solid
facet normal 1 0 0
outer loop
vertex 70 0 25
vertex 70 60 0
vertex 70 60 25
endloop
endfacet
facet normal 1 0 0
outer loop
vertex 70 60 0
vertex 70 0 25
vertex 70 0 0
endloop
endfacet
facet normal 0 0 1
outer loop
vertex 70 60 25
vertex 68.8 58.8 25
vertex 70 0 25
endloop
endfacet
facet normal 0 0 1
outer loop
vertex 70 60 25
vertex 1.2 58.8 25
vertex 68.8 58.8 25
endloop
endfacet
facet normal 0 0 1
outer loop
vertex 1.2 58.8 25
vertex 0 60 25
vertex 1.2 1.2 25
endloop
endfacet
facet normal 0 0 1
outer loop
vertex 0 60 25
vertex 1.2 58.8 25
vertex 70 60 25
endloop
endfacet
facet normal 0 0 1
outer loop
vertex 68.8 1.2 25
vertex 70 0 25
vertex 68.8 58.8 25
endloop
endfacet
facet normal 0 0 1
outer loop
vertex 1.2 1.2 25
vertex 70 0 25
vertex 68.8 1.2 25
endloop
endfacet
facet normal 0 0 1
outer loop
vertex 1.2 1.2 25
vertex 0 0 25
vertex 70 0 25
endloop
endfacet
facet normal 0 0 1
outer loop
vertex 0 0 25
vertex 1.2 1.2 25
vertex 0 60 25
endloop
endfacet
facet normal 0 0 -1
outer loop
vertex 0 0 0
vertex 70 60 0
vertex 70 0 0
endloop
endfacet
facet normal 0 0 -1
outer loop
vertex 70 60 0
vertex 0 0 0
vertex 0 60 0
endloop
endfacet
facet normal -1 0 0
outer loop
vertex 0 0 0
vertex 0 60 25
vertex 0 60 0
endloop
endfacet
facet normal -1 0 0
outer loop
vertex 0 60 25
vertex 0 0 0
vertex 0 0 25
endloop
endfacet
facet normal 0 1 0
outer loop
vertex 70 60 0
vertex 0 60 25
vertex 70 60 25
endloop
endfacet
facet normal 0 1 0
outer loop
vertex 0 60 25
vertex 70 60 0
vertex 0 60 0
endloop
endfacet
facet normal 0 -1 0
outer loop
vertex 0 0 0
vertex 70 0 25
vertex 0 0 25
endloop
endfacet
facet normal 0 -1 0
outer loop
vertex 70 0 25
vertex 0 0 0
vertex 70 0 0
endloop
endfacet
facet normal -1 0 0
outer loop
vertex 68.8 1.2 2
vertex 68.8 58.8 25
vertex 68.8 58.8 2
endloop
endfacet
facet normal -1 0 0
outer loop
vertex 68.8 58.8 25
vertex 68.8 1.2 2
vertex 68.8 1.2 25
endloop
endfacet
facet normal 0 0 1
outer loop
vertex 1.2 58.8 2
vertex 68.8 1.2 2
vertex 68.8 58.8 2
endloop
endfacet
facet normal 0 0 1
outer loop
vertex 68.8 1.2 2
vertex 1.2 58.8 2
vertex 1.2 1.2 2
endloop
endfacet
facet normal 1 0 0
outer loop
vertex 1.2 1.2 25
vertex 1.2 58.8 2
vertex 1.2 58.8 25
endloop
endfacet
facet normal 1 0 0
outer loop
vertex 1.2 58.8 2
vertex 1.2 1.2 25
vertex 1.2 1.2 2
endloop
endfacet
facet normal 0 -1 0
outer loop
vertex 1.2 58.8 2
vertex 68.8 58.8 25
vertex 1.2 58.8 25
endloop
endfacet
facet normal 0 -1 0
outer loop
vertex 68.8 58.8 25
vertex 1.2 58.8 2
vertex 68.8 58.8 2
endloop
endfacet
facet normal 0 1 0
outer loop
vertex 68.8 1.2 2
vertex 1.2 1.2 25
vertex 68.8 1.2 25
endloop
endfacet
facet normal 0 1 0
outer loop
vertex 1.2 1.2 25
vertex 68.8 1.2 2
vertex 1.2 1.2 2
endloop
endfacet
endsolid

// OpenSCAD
$fn = 32;

// ----------------------------------------------------------------------
// Open box: 1.2 mm walls
// ----------------------------------------------------------------------

// --- parameters (mm) ---
box_l = 70;               // outer length, X
box_w = 60;               // outer width, Y
box_h = 25;               // outer height, Z
wall = 1.2;               // wall thickness
floor = 2;                // floor thickness

difference() {
  cube([box_l, box_w, box_h]);
  translate([wall, wall, floor])
    cube([box_l - 2 * wall, box_w - 2 * wall, box_h]);
}
